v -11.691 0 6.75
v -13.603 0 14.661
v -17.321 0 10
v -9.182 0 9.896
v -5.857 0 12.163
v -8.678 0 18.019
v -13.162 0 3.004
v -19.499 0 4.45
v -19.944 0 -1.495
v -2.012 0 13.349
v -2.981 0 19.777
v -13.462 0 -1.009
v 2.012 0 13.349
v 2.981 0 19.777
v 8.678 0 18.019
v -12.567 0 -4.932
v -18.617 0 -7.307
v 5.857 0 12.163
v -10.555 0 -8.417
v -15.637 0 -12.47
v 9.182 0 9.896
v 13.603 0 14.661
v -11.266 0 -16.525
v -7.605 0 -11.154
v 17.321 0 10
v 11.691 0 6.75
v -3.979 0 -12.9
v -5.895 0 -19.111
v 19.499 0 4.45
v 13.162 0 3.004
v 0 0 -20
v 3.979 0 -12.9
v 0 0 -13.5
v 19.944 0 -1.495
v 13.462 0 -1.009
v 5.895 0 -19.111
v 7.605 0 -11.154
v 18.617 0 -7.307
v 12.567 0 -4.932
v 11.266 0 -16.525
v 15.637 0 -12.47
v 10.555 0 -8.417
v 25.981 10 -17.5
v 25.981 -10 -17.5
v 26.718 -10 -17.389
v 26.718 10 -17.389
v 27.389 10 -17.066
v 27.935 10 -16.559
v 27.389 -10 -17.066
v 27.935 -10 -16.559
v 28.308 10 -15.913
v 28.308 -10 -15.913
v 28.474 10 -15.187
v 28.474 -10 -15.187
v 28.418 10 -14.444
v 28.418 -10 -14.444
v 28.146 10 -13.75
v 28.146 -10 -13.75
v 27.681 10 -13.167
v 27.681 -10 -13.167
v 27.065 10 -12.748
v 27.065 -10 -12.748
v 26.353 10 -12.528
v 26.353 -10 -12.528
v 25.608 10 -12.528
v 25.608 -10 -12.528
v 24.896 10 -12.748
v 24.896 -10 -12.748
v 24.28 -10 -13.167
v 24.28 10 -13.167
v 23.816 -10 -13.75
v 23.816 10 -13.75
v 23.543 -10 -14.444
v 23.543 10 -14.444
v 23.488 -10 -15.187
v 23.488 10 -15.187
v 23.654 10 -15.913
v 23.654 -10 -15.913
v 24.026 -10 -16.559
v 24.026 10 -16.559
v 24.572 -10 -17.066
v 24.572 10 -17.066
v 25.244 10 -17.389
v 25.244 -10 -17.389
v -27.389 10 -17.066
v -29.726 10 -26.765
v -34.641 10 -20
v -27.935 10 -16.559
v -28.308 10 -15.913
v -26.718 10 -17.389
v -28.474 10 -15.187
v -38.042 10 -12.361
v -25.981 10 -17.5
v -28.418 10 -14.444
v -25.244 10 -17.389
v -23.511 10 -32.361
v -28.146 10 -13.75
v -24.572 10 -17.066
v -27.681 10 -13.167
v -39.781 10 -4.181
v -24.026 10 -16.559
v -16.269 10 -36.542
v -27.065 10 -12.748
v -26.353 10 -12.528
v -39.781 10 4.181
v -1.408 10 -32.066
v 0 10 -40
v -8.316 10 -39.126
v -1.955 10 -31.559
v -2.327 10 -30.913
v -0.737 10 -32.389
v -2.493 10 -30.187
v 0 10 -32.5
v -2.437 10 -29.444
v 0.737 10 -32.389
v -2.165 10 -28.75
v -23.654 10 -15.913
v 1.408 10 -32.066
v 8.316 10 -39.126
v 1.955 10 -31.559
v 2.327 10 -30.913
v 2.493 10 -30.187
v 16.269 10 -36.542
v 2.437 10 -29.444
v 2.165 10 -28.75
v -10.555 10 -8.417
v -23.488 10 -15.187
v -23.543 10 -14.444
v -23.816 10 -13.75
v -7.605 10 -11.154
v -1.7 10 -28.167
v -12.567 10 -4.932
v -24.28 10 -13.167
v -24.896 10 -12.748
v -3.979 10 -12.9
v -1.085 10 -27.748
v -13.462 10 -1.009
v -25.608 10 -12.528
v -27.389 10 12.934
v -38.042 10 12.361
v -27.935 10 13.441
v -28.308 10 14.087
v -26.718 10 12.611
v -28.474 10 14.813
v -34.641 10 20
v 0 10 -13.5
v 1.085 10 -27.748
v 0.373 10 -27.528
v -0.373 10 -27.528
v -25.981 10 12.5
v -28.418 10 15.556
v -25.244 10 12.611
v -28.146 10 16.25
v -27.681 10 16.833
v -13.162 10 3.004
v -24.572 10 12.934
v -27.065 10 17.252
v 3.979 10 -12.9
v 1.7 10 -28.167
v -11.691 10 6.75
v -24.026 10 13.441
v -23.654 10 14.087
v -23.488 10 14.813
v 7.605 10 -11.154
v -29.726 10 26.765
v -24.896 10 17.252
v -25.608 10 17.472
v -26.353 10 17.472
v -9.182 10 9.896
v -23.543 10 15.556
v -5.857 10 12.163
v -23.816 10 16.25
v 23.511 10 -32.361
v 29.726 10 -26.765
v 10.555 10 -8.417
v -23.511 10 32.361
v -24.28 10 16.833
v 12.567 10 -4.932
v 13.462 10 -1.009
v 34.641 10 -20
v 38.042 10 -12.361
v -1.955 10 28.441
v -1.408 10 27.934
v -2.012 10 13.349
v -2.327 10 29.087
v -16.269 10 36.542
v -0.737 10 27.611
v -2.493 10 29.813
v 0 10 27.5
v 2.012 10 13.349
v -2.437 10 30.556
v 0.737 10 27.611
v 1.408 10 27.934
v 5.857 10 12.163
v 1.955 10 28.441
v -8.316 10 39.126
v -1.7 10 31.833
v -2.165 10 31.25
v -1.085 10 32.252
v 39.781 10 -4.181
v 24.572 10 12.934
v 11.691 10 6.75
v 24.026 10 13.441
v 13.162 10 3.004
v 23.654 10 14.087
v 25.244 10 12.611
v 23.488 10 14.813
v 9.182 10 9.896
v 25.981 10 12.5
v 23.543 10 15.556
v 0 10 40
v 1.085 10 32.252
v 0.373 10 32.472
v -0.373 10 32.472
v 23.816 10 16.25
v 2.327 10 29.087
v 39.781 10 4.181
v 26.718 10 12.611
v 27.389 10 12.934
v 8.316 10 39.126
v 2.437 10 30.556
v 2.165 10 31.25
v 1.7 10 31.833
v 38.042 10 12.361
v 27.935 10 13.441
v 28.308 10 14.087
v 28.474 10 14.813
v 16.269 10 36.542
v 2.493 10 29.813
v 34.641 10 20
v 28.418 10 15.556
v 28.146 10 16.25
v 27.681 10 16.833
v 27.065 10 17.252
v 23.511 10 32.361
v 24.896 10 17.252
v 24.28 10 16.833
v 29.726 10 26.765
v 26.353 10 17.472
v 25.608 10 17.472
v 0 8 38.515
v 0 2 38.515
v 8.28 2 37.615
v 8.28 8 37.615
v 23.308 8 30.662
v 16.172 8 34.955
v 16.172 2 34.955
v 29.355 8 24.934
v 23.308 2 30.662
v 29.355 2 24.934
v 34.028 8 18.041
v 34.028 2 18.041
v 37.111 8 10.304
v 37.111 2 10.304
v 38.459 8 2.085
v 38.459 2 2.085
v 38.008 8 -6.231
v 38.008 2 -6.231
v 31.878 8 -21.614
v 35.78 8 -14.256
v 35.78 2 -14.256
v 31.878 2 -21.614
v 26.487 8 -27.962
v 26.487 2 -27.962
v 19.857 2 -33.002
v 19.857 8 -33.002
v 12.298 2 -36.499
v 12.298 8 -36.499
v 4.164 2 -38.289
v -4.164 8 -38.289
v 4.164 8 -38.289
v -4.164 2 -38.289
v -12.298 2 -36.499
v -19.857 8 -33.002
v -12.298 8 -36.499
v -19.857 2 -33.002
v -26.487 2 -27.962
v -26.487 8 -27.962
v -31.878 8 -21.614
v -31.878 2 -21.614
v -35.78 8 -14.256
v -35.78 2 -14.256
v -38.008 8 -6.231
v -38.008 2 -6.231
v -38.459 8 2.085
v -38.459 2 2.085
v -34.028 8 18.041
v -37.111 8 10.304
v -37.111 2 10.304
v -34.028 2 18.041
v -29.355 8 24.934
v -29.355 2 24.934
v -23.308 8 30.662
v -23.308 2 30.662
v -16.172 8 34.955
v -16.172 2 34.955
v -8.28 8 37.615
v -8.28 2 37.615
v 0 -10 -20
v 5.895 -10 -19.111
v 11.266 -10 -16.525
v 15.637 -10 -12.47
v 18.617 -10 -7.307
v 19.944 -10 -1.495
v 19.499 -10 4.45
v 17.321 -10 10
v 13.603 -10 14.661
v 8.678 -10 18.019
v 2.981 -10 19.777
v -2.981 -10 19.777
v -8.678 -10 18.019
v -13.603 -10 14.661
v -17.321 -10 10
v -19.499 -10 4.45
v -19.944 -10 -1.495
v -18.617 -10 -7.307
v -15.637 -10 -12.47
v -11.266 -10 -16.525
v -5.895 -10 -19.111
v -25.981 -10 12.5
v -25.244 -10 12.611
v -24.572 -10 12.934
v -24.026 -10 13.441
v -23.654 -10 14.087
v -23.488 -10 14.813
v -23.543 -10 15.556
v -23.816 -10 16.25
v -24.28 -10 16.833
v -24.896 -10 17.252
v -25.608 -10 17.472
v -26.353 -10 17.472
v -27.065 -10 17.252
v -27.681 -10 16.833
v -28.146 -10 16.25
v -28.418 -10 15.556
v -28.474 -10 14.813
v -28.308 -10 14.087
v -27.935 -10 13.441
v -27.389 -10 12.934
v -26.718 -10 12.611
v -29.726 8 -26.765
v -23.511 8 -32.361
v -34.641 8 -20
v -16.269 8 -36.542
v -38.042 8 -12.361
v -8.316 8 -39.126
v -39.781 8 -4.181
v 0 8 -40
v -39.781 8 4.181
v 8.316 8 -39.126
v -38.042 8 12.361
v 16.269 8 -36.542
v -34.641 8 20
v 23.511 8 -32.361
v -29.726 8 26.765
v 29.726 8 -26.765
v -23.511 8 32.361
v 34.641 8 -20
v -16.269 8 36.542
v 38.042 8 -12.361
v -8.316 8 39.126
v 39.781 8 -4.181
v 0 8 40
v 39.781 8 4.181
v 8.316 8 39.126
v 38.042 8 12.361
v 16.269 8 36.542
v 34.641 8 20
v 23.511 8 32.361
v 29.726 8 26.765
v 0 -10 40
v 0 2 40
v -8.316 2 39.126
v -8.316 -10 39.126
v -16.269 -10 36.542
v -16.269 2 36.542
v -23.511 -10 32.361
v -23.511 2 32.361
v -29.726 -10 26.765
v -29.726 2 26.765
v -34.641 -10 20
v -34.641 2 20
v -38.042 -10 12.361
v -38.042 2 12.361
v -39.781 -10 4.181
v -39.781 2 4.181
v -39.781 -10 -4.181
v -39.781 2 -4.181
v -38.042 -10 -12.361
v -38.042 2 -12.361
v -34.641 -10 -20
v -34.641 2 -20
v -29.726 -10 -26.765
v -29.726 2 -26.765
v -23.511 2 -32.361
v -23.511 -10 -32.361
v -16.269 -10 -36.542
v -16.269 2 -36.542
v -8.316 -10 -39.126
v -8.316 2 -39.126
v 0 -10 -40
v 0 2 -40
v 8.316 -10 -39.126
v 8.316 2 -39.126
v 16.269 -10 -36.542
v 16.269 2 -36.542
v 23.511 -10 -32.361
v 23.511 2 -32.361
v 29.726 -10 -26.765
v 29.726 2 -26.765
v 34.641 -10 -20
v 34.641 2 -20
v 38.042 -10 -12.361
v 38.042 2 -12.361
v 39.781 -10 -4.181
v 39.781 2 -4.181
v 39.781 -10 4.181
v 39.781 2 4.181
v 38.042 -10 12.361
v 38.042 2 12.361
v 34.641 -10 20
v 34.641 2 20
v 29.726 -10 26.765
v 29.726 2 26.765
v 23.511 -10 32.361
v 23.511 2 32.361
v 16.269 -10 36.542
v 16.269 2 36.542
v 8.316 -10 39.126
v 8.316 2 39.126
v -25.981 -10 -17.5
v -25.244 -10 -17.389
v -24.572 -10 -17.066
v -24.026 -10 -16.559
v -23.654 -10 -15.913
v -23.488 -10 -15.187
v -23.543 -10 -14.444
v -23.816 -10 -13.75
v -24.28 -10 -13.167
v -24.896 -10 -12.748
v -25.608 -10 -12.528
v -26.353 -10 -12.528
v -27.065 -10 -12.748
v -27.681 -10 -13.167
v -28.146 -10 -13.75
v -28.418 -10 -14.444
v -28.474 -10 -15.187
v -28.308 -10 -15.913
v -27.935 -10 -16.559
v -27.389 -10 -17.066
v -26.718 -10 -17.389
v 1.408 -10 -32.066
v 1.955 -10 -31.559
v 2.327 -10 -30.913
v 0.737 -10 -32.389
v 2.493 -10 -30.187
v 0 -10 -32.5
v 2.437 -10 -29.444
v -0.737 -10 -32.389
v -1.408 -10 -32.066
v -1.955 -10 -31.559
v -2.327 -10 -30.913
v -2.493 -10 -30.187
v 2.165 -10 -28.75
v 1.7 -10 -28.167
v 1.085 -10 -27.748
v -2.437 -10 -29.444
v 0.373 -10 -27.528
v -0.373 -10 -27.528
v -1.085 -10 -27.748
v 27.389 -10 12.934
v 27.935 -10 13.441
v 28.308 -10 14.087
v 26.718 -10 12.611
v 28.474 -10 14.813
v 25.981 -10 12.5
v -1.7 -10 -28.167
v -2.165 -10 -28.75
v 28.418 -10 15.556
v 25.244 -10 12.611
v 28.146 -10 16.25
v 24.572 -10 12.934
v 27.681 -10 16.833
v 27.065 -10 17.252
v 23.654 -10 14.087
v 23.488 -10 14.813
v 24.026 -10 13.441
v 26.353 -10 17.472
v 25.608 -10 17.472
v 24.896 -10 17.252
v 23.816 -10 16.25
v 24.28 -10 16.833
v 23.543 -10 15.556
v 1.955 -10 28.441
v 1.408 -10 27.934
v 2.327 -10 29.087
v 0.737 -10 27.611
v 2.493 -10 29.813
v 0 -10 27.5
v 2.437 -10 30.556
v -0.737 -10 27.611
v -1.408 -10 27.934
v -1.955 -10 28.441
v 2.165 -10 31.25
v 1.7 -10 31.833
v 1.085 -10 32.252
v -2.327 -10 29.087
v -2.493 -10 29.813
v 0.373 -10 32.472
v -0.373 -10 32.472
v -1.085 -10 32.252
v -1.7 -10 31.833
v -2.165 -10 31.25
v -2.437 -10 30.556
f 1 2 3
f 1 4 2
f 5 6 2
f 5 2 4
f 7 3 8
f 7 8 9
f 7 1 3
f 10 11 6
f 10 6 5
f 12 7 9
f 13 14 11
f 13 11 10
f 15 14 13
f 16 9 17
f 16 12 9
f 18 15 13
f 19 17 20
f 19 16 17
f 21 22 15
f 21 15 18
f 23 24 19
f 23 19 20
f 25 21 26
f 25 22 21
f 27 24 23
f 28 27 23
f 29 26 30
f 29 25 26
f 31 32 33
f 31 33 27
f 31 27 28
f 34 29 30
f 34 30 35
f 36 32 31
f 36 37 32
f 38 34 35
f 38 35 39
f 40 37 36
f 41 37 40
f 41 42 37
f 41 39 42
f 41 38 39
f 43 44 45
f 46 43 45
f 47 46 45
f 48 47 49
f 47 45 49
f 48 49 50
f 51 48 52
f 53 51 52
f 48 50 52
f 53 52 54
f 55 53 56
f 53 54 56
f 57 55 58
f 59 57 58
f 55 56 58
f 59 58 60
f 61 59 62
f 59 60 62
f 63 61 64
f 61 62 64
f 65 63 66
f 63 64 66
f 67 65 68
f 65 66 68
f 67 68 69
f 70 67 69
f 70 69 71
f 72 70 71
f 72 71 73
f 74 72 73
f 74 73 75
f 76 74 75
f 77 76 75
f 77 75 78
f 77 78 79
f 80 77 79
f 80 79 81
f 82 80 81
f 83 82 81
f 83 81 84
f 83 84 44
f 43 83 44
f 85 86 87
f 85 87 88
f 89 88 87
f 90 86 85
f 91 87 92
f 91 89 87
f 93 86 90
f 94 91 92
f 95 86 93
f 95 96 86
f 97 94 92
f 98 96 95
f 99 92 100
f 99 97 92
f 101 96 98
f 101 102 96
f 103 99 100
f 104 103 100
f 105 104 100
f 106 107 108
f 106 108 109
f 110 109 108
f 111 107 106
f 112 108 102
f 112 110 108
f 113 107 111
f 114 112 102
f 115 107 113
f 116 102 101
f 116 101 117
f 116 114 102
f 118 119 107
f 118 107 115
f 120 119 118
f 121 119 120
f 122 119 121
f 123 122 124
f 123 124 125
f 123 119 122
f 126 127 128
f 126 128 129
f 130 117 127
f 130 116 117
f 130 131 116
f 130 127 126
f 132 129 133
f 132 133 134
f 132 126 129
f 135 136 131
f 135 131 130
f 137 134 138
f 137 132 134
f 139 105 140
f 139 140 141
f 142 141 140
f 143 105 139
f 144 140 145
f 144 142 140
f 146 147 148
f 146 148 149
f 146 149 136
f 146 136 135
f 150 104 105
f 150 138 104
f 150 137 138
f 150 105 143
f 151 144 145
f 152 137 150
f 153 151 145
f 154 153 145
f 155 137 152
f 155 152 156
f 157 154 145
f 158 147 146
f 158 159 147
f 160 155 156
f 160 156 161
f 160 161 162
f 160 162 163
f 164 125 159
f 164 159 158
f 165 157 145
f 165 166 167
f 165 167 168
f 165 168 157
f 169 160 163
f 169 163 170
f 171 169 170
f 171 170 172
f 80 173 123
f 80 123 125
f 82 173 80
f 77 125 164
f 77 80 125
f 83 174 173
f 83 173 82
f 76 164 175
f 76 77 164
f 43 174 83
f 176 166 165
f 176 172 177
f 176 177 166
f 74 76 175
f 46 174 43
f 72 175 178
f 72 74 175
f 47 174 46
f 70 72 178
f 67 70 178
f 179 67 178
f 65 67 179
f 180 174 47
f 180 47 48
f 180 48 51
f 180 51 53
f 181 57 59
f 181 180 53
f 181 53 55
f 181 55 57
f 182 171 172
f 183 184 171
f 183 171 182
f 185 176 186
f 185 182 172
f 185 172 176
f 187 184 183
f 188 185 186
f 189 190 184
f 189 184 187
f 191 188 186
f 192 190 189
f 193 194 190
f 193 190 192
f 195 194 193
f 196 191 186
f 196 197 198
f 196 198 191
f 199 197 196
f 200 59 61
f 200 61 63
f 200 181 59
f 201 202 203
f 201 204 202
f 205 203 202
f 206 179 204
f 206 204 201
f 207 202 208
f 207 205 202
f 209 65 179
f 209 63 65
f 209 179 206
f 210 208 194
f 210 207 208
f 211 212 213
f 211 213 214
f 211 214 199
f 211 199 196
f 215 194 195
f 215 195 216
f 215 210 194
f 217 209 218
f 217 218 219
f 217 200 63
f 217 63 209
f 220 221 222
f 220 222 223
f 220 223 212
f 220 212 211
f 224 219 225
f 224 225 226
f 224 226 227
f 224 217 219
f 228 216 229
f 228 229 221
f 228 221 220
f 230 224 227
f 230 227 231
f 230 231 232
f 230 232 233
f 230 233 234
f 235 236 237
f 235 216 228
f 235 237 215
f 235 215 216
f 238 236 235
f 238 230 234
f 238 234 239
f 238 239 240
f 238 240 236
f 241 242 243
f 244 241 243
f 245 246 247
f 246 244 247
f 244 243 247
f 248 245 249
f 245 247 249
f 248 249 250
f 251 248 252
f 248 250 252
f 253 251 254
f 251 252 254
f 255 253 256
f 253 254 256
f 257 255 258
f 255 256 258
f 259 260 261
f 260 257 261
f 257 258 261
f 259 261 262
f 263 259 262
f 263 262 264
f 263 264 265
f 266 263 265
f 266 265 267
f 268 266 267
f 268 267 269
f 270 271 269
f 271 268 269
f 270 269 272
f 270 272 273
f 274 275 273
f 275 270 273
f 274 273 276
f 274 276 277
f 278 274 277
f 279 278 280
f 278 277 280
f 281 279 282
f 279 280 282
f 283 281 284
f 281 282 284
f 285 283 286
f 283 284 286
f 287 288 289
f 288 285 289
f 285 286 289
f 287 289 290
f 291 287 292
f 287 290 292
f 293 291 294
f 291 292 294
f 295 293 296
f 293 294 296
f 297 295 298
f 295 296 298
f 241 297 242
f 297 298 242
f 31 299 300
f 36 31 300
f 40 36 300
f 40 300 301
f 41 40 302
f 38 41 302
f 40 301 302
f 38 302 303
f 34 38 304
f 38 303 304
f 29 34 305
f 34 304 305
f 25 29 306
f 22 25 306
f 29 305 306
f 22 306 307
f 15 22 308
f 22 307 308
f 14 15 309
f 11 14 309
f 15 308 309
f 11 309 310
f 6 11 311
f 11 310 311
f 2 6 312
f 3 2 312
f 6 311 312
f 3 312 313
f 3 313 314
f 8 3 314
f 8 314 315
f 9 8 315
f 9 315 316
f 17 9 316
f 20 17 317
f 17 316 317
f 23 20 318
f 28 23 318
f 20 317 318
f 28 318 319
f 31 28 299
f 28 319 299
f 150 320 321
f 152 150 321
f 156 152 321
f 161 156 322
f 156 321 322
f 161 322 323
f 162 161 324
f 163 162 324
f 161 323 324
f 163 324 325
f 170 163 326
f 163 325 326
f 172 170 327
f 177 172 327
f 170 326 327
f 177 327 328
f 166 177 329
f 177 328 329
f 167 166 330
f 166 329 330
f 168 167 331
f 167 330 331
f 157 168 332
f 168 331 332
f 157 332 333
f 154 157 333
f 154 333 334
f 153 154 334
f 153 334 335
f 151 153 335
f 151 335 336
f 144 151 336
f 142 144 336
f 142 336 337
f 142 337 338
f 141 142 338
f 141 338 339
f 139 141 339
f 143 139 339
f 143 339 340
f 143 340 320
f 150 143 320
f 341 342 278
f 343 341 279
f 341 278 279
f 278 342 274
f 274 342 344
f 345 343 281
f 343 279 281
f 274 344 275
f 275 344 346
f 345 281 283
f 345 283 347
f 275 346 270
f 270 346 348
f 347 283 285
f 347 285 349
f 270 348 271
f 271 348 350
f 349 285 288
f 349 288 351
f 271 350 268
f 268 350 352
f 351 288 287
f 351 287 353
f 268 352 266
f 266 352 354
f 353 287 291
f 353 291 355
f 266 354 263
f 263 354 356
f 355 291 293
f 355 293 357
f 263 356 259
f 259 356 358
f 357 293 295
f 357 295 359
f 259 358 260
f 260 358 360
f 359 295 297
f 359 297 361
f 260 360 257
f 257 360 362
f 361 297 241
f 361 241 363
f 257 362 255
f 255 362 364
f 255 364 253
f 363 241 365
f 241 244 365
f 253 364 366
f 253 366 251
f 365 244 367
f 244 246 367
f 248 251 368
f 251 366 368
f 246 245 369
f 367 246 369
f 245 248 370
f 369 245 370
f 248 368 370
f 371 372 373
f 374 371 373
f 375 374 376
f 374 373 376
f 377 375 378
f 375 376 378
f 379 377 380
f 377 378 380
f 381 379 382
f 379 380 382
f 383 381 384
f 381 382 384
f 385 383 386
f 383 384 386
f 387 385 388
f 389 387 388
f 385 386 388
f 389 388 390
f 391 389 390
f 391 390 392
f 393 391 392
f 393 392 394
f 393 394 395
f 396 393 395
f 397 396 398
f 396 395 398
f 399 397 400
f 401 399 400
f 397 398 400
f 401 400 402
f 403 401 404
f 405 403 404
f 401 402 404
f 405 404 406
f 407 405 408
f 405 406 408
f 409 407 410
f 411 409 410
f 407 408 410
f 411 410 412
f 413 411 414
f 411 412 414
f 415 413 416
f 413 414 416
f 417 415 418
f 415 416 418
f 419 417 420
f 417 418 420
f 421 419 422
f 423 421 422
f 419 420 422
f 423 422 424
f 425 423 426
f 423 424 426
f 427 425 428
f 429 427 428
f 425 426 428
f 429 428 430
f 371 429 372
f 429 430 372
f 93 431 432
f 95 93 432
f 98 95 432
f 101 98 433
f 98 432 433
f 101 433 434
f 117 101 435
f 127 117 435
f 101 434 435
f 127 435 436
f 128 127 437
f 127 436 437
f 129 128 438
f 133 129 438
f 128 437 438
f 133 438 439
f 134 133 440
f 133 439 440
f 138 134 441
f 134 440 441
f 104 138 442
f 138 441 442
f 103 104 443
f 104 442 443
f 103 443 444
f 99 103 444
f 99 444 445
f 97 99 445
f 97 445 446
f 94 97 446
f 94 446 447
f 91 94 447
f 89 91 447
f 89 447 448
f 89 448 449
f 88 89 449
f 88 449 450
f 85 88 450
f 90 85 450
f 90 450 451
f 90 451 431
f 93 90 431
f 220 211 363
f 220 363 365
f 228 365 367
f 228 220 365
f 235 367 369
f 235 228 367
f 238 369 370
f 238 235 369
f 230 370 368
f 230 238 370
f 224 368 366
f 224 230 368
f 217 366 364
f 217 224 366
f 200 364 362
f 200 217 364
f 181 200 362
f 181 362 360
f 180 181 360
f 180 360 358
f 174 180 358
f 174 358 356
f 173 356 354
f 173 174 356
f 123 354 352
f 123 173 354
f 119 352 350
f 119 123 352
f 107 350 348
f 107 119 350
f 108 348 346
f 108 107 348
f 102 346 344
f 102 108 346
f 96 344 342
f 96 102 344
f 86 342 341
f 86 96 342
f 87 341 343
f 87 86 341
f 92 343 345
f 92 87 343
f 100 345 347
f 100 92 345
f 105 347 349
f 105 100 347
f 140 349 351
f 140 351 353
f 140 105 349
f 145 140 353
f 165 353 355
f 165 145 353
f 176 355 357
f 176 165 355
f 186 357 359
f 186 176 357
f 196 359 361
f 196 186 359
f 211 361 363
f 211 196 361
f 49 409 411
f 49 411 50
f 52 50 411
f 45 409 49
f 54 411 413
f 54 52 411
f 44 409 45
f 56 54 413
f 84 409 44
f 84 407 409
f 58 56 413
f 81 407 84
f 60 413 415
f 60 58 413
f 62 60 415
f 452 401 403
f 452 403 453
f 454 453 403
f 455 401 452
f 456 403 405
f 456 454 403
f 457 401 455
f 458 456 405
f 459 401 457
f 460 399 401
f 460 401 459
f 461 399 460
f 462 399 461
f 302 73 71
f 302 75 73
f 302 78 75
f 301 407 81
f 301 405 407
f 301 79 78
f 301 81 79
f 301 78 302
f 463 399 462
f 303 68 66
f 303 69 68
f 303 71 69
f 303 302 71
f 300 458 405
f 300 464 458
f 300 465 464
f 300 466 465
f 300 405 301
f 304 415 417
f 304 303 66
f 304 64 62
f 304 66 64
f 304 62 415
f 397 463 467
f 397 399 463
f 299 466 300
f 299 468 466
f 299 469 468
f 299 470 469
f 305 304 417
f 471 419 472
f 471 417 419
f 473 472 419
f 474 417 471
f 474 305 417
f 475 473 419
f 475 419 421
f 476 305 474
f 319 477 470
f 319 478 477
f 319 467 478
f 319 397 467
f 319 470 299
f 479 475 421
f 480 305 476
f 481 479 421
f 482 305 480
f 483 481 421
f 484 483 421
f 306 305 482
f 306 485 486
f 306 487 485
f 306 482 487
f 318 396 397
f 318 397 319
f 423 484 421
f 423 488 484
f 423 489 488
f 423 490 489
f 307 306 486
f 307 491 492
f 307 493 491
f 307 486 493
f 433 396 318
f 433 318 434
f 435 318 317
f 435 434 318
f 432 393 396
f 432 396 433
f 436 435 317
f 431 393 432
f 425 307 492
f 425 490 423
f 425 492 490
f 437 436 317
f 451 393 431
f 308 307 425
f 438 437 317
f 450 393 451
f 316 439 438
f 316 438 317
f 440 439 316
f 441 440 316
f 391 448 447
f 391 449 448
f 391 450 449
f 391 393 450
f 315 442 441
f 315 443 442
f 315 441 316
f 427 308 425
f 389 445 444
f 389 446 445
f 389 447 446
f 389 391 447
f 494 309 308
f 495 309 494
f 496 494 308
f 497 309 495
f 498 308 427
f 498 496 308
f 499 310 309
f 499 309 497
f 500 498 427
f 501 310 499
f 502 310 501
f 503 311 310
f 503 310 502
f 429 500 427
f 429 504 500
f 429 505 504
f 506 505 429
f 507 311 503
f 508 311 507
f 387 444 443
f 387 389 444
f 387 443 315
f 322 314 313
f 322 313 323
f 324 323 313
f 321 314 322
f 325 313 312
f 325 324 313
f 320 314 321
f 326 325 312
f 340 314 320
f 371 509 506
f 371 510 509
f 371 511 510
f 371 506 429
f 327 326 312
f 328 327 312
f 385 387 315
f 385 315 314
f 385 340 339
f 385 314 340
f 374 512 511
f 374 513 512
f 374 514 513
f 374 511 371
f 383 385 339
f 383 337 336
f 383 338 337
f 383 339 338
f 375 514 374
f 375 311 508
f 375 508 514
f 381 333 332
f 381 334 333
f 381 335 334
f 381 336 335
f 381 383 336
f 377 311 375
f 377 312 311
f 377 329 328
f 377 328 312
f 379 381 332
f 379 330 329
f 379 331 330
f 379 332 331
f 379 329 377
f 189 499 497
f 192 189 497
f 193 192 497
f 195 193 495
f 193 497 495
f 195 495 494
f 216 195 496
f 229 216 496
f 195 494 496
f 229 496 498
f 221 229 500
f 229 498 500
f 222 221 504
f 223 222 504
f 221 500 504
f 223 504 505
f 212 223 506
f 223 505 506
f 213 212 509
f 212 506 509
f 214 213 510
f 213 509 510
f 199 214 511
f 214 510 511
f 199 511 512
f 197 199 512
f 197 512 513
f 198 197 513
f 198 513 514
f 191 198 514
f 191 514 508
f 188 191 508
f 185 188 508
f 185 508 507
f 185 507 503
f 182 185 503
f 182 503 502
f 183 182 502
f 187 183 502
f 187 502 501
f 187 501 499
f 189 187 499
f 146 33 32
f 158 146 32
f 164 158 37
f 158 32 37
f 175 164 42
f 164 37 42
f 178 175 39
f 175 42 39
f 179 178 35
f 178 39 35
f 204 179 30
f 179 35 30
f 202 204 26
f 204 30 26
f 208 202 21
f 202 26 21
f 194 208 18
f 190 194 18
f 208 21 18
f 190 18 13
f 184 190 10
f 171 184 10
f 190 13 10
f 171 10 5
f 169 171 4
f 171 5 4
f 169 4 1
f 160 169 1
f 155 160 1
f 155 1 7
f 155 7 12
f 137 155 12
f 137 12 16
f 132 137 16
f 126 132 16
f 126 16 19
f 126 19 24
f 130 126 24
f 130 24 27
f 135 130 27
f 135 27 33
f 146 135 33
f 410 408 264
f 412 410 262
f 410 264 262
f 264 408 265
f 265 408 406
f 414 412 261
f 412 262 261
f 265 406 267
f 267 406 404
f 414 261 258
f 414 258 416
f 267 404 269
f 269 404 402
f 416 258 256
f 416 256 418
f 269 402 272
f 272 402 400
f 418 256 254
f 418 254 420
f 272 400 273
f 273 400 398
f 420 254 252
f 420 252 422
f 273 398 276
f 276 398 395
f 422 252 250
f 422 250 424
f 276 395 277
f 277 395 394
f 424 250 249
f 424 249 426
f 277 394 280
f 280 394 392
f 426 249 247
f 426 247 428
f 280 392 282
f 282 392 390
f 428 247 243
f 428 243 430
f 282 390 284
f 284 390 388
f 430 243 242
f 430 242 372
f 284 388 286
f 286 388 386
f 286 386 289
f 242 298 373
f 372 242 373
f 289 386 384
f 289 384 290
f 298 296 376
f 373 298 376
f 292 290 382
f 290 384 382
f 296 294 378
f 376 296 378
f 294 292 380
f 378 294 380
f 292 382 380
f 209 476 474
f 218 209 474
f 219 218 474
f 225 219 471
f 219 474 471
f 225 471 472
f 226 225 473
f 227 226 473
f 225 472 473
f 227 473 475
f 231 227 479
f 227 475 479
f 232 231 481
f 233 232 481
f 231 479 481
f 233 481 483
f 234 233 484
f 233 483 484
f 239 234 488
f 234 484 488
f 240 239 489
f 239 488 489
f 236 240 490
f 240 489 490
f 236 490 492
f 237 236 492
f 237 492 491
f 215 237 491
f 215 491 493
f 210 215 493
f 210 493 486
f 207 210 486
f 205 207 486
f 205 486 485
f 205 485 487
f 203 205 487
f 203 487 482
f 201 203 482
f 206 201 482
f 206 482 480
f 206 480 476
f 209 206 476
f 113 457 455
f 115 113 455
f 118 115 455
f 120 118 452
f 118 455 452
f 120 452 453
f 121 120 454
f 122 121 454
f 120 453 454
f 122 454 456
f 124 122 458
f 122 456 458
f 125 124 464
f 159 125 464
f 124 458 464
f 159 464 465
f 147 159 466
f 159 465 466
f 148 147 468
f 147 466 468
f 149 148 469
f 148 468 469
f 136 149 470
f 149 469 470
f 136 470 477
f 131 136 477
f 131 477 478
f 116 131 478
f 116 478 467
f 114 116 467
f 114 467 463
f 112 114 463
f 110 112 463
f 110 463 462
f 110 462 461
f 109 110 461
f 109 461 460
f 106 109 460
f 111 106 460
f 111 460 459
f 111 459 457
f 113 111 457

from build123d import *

# Parameters (mm, degrees)
SKETCH1_R                = 38.515
BOSS_EXTRUDE1_DEPTH      = 10
SKETCH2_R                = 40
BOSS_EXTRUDE2_DEPTH      = 2
BOSS_EXTRUDE3_DEPTH      = 10
BOSS_EXTRUDE3_DEPTH_BACK = 2
SKETCH3_R                = 40
SKETCH4_R                = 13.5
SKETCH4_R_2              = 2.5
CUT_EXTRUDE1_DEPTH       = 61
SKETCH5_R                = 20
CUT_EXTRUDE2_DEPTH       = 10


with BuildPart() as part:
    # Sketch1 → Boss-Extrude1 (new body)
    with BuildSketch(Plane(origin=(0, 0, 0), x_dir=(1, 0, 0), z_dir=(0, 1, 0))):
        with Locations(Location((0, 0, 0), (0, 0, 270))):
            Circle(SKETCH1_R)
    extrude(amount=BOSS_EXTRUDE1_DEPTH)

    # Sketch2 → Boss-Extrude2 (add)
    with BuildSketch(Plane(origin=(0, 10, 0), x_dir=(1, 0, 0), z_dir=(0, 1, 0))):
        with Locations(Location((0, 0, 0), (0, 0, 270))):
            Circle(SKETCH2_R)
    extrude(amount=-BOSS_EXTRUDE2_DEPTH)

    # Sketch3 → Boss-Extrude3 (add, two sides: drawn at the far end of the back side and taken through both)
    with BuildSketch(Plane.XZ.offset(-BOSS_EXTRUDE3_DEPTH_BACK)):
        with Locations(Location((0, 0, 0), (0, 0, 90))):
            Circle(SKETCH3_R)
    extrude(amount=BOSS_EXTRUDE3_DEPTH + BOSS_EXTRUDE3_DEPTH_BACK)

    # Sketch4 → Cut-Extrude1 (cut, through all)
    with BuildSketch(Plane.XZ.offset(10)):
        with Locations(Location((0, 0, 0), (0, 0, 270))):
            Circle(SKETCH4_R)
        with Locations(Location((0, 30, 0), (0, 0, 270))):
            Circle(SKETCH4_R_2)
        with Locations(Location((25.980762114, 15, 0), (0, 0, 270))):
            Circle(SKETCH4_R_2)
        with Locations(Location((25.980762114, -15, 0), (0, 0, 270))):
            Circle(SKETCH4_R_2)
        with Locations(Location((0, -30, 0), (0, 0, 270))):
            Circle(SKETCH4_R_2)
        with Locations(Location((-25.980762114, -15, 0), (0, 0, 270))):
            Circle(SKETCH4_R_2)
        with Locations(Location((-25.980762114, 15, 0), (0, 0, 270))):
            Circle(SKETCH4_R_2)
    extrude(amount=-CUT_EXTRUDE1_DEPTH, mode=Mode.SUBTRACT)

    # Sketch5 → Cut-Extrude2 (cut)
    with BuildSketch(Plane.XZ.offset(10)):
        with Locations(Location((0, 0, 0), (0, 0, 270))):
            Circle(SKETCH5_R)
    extrude(amount=-CUT_EXTRUDE2_DEPTH, mode=Mode.SUBTRACT)


solid = part.part
